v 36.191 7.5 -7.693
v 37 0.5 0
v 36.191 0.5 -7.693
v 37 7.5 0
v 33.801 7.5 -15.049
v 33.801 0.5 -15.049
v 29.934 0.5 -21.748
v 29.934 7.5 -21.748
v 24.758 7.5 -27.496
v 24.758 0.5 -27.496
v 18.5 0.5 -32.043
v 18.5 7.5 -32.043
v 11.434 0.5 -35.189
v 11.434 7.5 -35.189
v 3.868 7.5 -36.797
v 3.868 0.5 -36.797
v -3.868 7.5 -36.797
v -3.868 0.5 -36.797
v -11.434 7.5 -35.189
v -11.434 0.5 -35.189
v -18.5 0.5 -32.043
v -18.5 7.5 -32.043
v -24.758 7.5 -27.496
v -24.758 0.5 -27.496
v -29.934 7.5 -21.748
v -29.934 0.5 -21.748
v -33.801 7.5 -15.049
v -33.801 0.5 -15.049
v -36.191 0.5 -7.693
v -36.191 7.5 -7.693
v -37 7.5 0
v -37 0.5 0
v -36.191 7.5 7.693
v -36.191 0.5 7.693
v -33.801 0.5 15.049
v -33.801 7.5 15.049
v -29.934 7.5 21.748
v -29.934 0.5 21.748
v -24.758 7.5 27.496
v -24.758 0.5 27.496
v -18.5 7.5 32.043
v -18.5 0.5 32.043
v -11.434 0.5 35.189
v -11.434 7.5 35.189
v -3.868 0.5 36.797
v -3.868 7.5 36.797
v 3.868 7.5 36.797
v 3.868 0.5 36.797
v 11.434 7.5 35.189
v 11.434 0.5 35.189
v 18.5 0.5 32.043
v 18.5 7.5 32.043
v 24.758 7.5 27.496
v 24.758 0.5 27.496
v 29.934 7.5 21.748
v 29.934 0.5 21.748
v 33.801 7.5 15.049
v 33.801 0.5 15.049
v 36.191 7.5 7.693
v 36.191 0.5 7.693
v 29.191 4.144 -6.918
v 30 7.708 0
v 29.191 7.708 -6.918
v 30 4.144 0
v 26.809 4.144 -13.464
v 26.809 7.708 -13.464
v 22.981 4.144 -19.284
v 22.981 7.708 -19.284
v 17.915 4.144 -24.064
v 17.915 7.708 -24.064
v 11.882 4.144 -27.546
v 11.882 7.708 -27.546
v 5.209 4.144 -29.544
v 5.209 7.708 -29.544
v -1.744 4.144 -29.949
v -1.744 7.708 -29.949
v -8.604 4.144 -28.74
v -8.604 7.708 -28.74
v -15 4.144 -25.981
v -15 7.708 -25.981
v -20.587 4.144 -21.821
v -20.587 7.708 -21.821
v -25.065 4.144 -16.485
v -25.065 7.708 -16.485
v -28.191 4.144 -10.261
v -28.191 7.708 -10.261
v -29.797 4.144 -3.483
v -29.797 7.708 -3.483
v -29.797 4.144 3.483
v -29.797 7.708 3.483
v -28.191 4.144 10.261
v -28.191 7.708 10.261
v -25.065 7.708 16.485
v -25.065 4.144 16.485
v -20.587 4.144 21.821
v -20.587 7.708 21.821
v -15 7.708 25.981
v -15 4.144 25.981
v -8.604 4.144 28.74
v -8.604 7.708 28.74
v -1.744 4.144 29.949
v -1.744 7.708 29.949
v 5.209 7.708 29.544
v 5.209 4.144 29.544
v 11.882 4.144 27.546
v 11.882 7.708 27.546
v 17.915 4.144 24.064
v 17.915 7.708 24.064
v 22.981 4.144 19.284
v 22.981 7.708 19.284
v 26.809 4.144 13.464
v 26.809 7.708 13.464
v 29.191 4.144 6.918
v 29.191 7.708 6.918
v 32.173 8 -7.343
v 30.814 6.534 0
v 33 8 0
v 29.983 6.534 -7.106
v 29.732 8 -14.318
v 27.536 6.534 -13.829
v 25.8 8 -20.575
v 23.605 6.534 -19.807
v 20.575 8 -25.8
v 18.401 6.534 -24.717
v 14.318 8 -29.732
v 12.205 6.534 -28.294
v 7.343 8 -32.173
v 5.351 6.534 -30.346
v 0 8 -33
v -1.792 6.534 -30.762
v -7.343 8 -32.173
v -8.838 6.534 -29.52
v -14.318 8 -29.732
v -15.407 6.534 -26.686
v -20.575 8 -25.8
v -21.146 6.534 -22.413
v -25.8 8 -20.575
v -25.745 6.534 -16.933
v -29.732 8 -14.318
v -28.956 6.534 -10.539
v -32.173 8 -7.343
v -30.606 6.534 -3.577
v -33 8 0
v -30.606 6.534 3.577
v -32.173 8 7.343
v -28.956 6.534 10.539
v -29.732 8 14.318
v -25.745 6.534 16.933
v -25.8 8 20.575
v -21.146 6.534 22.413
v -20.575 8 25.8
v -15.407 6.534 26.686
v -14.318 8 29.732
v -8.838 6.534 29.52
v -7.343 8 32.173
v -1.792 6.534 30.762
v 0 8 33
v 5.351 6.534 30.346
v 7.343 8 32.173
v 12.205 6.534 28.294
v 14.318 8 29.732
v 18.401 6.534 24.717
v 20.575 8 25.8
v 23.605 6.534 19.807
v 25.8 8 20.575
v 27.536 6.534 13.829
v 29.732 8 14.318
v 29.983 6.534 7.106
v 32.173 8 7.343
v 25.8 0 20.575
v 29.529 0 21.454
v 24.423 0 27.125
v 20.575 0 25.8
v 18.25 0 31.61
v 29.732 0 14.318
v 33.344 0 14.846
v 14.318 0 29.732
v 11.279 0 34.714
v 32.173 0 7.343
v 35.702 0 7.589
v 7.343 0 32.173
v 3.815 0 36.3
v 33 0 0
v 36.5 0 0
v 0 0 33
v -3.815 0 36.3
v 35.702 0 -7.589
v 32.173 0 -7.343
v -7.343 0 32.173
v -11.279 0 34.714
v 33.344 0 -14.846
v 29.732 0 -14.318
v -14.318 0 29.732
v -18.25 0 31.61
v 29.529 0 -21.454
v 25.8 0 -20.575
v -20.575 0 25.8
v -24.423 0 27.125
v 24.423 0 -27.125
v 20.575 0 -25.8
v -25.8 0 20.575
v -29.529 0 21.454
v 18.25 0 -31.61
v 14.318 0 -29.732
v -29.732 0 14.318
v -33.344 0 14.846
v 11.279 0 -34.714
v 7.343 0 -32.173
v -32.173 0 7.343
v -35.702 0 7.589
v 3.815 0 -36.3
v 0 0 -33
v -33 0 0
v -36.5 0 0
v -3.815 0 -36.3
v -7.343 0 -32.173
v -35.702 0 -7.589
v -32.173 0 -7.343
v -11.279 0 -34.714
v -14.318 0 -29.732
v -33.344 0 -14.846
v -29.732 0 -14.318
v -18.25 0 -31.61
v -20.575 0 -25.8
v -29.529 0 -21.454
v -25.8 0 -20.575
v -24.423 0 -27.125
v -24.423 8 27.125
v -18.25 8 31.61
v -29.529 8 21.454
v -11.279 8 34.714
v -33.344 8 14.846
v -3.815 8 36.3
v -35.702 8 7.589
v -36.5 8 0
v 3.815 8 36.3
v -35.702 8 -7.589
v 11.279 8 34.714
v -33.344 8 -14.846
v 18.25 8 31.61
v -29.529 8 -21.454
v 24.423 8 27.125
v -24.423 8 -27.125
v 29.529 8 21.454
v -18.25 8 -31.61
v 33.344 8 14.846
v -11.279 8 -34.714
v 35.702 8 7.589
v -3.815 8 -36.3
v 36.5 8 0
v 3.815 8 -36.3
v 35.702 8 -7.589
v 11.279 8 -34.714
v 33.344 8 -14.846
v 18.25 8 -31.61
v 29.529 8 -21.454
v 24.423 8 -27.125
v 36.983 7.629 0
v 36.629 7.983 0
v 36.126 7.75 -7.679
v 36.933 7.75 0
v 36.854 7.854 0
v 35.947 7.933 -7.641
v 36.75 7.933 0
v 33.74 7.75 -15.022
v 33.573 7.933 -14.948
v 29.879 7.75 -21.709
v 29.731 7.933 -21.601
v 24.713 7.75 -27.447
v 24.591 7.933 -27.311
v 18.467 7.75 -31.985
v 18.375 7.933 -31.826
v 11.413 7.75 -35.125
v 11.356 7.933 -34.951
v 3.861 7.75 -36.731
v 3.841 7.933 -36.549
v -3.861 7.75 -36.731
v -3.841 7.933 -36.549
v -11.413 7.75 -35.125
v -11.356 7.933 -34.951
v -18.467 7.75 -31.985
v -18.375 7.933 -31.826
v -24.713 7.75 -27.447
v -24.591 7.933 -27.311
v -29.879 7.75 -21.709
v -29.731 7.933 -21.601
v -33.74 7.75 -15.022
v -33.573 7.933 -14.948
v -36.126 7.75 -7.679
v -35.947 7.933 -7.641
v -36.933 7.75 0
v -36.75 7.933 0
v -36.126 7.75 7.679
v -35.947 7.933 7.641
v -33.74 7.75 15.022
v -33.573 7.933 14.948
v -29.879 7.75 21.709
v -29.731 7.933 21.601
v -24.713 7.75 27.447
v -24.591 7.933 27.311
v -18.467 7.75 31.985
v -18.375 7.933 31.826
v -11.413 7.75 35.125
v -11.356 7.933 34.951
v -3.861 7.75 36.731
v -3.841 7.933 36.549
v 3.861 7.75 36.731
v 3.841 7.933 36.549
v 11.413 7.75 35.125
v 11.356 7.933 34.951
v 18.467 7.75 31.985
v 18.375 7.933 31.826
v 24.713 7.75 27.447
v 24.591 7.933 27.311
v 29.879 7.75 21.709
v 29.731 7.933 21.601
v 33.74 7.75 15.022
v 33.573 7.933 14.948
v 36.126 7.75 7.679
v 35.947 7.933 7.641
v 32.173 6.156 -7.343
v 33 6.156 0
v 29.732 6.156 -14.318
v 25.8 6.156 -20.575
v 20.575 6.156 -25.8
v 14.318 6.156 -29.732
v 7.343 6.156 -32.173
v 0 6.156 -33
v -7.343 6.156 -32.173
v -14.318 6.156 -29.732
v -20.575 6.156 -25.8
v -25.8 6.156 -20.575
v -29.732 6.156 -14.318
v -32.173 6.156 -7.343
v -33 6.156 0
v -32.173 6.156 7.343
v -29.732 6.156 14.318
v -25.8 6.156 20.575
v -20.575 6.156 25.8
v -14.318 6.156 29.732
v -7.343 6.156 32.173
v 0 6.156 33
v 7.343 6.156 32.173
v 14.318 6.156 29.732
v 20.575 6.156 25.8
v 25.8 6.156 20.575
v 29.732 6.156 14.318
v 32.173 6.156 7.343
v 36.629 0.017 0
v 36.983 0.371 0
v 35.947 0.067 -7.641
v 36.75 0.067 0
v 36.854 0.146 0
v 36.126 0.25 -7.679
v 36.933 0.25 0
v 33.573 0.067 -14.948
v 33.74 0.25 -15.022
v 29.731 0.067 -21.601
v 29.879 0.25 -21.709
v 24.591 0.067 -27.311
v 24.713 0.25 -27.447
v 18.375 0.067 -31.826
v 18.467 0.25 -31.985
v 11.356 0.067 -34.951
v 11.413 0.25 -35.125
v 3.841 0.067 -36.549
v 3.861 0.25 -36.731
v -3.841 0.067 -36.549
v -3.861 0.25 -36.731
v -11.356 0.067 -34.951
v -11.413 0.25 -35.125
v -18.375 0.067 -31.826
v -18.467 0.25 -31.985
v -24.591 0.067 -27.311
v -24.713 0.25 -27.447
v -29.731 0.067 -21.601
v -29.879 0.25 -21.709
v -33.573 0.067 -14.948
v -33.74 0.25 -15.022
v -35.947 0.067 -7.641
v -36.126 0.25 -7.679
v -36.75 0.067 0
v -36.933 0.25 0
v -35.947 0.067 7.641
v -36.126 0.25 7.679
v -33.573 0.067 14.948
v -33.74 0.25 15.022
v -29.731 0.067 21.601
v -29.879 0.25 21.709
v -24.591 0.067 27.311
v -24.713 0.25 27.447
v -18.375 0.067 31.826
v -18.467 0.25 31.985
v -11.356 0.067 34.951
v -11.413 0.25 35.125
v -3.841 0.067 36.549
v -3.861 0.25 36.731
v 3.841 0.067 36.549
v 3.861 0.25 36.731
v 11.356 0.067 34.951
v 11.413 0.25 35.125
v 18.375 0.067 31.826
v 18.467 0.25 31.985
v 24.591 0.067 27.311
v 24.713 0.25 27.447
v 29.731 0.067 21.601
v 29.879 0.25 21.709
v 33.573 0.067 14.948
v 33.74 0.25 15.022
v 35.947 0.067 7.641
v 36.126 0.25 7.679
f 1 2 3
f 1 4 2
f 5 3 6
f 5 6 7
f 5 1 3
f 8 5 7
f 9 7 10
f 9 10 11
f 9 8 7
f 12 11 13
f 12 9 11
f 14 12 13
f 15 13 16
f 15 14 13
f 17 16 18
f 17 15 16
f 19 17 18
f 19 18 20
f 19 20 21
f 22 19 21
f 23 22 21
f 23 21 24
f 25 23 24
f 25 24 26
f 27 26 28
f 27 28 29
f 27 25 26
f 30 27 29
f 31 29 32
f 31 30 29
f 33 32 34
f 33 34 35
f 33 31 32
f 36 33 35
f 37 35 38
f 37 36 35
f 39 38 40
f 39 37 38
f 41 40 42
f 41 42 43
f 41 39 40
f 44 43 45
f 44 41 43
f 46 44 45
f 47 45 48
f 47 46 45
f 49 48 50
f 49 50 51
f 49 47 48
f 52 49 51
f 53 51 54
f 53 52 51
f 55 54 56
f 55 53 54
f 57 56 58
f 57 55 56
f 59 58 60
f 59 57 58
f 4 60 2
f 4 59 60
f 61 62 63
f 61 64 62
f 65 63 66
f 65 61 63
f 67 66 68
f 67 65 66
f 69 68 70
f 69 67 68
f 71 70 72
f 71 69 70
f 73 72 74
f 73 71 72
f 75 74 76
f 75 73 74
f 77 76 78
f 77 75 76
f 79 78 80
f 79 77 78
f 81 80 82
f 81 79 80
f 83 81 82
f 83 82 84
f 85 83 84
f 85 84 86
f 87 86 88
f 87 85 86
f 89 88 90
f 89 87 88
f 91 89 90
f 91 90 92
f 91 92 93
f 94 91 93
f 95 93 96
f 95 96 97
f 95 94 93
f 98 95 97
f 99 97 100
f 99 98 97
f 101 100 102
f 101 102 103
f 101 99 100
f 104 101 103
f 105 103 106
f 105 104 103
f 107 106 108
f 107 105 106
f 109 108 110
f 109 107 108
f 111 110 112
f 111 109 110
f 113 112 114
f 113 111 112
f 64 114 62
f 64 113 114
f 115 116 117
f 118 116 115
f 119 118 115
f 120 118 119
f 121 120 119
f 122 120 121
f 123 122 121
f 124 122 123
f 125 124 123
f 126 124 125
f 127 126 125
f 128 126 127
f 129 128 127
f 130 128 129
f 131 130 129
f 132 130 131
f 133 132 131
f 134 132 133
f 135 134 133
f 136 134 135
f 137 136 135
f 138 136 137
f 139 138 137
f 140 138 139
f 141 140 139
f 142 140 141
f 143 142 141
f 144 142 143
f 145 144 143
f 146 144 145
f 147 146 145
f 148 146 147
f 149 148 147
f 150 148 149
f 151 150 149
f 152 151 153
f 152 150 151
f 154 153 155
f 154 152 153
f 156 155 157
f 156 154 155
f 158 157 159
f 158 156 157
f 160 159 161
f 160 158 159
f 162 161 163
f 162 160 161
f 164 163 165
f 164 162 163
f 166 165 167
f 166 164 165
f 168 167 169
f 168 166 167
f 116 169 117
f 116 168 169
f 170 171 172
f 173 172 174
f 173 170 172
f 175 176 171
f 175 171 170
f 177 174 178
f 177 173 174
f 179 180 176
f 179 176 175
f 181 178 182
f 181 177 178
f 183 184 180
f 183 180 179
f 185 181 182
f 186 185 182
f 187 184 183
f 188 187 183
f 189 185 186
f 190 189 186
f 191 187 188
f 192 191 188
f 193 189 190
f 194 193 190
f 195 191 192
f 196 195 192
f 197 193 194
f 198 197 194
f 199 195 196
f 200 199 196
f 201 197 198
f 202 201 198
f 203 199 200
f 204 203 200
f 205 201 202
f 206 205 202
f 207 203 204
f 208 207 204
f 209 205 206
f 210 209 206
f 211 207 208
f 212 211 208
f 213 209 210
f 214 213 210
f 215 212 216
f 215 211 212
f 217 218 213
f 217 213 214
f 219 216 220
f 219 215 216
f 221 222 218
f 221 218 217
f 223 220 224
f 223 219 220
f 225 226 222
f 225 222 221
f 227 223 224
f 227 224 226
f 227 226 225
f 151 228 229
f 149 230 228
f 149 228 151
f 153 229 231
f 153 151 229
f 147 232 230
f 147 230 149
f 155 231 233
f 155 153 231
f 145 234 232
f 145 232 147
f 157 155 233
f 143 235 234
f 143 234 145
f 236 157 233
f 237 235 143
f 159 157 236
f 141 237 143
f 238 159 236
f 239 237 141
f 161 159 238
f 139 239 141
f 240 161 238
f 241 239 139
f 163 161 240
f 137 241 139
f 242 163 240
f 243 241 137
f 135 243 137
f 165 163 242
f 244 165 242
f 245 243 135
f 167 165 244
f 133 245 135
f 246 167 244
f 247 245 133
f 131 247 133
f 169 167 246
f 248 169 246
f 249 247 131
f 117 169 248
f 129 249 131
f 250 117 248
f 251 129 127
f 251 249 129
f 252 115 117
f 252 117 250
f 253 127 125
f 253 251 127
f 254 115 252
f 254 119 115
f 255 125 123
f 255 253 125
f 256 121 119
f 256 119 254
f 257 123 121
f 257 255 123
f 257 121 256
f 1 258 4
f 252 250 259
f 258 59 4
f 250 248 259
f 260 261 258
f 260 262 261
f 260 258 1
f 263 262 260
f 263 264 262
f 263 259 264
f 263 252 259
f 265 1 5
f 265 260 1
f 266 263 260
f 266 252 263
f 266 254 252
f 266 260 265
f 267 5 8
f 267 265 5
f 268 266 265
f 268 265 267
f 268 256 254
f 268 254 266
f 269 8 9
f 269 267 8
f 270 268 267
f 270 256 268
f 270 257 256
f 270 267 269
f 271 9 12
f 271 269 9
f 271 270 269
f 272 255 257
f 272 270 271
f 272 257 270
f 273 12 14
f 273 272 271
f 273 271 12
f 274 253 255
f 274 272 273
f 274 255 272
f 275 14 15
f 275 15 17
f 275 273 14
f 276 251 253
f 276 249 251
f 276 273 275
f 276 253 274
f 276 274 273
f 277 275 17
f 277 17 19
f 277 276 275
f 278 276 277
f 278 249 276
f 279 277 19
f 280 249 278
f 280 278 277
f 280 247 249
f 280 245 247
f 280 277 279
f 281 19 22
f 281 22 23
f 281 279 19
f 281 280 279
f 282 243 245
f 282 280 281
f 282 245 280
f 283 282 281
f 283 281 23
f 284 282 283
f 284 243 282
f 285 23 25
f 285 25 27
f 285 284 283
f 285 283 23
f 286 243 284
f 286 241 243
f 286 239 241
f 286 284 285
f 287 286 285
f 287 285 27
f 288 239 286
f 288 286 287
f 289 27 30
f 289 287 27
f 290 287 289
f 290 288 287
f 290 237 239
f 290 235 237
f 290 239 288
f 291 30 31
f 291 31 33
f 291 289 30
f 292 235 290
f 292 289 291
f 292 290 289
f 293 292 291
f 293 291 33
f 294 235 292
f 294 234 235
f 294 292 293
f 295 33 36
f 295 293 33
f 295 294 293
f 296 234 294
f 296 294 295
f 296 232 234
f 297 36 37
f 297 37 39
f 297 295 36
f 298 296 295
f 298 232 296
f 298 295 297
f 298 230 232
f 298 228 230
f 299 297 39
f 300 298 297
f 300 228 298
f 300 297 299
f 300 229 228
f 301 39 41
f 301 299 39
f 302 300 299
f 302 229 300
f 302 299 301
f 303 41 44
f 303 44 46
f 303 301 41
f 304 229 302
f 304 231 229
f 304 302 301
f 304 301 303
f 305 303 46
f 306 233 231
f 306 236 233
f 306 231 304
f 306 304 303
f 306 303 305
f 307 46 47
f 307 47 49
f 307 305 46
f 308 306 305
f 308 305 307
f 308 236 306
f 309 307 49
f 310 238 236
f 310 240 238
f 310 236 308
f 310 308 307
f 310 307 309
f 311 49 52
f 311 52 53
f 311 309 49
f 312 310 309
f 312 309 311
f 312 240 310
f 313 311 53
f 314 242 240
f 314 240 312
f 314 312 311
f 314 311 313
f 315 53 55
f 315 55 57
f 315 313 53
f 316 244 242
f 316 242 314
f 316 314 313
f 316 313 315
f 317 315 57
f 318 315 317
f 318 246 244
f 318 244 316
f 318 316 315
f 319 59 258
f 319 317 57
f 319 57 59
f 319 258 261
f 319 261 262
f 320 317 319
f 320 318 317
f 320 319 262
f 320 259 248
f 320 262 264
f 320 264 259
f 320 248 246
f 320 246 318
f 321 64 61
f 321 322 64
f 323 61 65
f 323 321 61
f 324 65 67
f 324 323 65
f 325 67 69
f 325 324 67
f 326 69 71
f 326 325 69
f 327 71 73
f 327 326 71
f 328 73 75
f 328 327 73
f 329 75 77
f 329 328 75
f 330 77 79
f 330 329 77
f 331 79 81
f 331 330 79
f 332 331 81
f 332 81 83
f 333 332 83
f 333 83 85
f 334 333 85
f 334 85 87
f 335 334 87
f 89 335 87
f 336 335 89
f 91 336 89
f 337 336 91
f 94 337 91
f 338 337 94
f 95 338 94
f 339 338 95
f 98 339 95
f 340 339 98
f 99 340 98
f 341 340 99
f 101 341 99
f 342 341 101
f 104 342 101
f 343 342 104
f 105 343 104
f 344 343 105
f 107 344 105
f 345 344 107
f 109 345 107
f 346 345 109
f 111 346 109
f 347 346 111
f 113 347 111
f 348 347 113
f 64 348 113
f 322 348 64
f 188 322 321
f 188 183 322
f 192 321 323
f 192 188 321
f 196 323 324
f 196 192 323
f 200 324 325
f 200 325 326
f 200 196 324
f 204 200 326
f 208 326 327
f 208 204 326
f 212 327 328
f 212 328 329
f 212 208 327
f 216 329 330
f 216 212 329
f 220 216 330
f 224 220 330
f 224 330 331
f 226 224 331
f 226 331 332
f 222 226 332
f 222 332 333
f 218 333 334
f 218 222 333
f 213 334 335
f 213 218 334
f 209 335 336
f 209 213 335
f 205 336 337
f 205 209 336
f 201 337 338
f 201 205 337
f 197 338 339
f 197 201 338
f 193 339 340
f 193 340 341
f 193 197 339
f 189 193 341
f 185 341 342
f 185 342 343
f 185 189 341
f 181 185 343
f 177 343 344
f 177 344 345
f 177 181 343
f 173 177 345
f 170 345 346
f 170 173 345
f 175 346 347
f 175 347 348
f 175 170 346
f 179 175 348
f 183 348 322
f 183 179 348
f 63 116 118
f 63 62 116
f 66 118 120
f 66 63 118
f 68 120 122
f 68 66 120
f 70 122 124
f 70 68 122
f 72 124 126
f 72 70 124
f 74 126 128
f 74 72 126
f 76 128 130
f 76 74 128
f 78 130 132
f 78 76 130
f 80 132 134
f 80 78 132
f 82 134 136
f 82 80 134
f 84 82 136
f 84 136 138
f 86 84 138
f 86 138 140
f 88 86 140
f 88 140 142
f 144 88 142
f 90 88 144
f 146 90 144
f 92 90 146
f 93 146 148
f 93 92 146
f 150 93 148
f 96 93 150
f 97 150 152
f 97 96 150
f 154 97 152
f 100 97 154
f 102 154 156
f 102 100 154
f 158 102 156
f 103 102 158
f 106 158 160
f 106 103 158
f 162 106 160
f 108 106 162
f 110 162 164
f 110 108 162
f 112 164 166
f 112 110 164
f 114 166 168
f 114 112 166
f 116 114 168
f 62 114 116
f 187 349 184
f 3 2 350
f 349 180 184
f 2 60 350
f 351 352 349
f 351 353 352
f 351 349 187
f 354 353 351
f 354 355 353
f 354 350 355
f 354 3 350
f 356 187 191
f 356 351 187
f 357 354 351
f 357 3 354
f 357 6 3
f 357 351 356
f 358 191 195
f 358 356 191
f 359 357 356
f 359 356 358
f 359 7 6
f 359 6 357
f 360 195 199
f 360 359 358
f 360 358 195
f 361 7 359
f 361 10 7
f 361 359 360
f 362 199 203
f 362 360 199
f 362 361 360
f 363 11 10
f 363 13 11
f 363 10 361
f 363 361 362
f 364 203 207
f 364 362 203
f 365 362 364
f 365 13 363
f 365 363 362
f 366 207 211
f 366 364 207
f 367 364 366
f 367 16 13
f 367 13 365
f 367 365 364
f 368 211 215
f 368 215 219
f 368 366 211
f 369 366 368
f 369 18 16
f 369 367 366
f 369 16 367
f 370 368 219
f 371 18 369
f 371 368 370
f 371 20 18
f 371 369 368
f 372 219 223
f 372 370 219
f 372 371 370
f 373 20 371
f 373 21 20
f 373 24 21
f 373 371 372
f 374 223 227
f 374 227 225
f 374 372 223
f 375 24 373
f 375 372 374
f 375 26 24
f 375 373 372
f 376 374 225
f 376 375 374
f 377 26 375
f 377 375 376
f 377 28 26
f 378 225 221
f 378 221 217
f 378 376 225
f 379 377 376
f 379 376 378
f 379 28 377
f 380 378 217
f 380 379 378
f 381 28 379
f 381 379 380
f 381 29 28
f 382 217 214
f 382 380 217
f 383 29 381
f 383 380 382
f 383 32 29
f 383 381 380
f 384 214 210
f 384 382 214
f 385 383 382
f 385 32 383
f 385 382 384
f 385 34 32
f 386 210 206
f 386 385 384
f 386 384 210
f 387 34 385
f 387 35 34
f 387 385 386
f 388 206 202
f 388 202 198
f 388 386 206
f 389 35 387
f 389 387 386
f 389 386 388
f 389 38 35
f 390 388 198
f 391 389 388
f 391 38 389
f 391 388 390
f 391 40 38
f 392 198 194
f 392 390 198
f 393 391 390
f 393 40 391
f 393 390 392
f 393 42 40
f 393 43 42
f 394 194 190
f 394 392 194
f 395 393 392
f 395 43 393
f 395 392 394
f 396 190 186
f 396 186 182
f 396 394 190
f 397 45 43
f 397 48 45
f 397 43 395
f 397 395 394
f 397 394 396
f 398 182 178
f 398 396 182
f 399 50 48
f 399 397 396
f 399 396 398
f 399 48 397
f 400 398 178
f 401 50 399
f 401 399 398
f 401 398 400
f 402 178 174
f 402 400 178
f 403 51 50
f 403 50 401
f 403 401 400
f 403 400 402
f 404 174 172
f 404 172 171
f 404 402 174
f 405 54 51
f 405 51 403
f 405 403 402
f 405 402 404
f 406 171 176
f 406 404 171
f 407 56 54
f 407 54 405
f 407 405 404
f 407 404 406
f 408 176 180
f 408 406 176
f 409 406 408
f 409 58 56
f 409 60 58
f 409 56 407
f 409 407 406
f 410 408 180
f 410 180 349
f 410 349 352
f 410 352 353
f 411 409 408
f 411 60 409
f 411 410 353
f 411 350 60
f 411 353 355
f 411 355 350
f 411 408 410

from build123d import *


with BuildPart() as part:
    # Schizzo1 → Rivoluzione1 (revolve)
    with BuildSketch(Plane.XY, mode=Mode.PRIVATE) as rivoluzione1_sk:
        with BuildLine():
            Line((-33, 0), (-36.5, 0))
            ThreePointArc((-36.5, 0), (-36.853553391, 0.146446609), (-37, 0.5))
            Line((-37, 0.5), (-37, 7.5))
            ThreePointArc((-37, 7.5), (-36.853553391, 7.853553391), (-36.5, 8))
            Line((-36.5, 8), (-33, 8))
            Line((-33, 8), (-30.814092893, 6.534380349))
            Line((-30.814092893, 6.534380349), (-30, 7.707960129))
            Line((-30, 7.707960129), (-30, 6.133062593))
            Line((-30, 6.133062593), (-30, 4.144217363))
            Line((-30, 4.144217363), (-33, 6.155674729))
            Line((-33, 6.155674729), (-33, 0))
        make_face()
    revolve(rivoluzione1_sk.sketch.rotate(Axis((0, 0, 0), (0, 1, 0)), 180), axis=Axis((0, 0, 0), (0, 1, 0)))


solid = part.part
